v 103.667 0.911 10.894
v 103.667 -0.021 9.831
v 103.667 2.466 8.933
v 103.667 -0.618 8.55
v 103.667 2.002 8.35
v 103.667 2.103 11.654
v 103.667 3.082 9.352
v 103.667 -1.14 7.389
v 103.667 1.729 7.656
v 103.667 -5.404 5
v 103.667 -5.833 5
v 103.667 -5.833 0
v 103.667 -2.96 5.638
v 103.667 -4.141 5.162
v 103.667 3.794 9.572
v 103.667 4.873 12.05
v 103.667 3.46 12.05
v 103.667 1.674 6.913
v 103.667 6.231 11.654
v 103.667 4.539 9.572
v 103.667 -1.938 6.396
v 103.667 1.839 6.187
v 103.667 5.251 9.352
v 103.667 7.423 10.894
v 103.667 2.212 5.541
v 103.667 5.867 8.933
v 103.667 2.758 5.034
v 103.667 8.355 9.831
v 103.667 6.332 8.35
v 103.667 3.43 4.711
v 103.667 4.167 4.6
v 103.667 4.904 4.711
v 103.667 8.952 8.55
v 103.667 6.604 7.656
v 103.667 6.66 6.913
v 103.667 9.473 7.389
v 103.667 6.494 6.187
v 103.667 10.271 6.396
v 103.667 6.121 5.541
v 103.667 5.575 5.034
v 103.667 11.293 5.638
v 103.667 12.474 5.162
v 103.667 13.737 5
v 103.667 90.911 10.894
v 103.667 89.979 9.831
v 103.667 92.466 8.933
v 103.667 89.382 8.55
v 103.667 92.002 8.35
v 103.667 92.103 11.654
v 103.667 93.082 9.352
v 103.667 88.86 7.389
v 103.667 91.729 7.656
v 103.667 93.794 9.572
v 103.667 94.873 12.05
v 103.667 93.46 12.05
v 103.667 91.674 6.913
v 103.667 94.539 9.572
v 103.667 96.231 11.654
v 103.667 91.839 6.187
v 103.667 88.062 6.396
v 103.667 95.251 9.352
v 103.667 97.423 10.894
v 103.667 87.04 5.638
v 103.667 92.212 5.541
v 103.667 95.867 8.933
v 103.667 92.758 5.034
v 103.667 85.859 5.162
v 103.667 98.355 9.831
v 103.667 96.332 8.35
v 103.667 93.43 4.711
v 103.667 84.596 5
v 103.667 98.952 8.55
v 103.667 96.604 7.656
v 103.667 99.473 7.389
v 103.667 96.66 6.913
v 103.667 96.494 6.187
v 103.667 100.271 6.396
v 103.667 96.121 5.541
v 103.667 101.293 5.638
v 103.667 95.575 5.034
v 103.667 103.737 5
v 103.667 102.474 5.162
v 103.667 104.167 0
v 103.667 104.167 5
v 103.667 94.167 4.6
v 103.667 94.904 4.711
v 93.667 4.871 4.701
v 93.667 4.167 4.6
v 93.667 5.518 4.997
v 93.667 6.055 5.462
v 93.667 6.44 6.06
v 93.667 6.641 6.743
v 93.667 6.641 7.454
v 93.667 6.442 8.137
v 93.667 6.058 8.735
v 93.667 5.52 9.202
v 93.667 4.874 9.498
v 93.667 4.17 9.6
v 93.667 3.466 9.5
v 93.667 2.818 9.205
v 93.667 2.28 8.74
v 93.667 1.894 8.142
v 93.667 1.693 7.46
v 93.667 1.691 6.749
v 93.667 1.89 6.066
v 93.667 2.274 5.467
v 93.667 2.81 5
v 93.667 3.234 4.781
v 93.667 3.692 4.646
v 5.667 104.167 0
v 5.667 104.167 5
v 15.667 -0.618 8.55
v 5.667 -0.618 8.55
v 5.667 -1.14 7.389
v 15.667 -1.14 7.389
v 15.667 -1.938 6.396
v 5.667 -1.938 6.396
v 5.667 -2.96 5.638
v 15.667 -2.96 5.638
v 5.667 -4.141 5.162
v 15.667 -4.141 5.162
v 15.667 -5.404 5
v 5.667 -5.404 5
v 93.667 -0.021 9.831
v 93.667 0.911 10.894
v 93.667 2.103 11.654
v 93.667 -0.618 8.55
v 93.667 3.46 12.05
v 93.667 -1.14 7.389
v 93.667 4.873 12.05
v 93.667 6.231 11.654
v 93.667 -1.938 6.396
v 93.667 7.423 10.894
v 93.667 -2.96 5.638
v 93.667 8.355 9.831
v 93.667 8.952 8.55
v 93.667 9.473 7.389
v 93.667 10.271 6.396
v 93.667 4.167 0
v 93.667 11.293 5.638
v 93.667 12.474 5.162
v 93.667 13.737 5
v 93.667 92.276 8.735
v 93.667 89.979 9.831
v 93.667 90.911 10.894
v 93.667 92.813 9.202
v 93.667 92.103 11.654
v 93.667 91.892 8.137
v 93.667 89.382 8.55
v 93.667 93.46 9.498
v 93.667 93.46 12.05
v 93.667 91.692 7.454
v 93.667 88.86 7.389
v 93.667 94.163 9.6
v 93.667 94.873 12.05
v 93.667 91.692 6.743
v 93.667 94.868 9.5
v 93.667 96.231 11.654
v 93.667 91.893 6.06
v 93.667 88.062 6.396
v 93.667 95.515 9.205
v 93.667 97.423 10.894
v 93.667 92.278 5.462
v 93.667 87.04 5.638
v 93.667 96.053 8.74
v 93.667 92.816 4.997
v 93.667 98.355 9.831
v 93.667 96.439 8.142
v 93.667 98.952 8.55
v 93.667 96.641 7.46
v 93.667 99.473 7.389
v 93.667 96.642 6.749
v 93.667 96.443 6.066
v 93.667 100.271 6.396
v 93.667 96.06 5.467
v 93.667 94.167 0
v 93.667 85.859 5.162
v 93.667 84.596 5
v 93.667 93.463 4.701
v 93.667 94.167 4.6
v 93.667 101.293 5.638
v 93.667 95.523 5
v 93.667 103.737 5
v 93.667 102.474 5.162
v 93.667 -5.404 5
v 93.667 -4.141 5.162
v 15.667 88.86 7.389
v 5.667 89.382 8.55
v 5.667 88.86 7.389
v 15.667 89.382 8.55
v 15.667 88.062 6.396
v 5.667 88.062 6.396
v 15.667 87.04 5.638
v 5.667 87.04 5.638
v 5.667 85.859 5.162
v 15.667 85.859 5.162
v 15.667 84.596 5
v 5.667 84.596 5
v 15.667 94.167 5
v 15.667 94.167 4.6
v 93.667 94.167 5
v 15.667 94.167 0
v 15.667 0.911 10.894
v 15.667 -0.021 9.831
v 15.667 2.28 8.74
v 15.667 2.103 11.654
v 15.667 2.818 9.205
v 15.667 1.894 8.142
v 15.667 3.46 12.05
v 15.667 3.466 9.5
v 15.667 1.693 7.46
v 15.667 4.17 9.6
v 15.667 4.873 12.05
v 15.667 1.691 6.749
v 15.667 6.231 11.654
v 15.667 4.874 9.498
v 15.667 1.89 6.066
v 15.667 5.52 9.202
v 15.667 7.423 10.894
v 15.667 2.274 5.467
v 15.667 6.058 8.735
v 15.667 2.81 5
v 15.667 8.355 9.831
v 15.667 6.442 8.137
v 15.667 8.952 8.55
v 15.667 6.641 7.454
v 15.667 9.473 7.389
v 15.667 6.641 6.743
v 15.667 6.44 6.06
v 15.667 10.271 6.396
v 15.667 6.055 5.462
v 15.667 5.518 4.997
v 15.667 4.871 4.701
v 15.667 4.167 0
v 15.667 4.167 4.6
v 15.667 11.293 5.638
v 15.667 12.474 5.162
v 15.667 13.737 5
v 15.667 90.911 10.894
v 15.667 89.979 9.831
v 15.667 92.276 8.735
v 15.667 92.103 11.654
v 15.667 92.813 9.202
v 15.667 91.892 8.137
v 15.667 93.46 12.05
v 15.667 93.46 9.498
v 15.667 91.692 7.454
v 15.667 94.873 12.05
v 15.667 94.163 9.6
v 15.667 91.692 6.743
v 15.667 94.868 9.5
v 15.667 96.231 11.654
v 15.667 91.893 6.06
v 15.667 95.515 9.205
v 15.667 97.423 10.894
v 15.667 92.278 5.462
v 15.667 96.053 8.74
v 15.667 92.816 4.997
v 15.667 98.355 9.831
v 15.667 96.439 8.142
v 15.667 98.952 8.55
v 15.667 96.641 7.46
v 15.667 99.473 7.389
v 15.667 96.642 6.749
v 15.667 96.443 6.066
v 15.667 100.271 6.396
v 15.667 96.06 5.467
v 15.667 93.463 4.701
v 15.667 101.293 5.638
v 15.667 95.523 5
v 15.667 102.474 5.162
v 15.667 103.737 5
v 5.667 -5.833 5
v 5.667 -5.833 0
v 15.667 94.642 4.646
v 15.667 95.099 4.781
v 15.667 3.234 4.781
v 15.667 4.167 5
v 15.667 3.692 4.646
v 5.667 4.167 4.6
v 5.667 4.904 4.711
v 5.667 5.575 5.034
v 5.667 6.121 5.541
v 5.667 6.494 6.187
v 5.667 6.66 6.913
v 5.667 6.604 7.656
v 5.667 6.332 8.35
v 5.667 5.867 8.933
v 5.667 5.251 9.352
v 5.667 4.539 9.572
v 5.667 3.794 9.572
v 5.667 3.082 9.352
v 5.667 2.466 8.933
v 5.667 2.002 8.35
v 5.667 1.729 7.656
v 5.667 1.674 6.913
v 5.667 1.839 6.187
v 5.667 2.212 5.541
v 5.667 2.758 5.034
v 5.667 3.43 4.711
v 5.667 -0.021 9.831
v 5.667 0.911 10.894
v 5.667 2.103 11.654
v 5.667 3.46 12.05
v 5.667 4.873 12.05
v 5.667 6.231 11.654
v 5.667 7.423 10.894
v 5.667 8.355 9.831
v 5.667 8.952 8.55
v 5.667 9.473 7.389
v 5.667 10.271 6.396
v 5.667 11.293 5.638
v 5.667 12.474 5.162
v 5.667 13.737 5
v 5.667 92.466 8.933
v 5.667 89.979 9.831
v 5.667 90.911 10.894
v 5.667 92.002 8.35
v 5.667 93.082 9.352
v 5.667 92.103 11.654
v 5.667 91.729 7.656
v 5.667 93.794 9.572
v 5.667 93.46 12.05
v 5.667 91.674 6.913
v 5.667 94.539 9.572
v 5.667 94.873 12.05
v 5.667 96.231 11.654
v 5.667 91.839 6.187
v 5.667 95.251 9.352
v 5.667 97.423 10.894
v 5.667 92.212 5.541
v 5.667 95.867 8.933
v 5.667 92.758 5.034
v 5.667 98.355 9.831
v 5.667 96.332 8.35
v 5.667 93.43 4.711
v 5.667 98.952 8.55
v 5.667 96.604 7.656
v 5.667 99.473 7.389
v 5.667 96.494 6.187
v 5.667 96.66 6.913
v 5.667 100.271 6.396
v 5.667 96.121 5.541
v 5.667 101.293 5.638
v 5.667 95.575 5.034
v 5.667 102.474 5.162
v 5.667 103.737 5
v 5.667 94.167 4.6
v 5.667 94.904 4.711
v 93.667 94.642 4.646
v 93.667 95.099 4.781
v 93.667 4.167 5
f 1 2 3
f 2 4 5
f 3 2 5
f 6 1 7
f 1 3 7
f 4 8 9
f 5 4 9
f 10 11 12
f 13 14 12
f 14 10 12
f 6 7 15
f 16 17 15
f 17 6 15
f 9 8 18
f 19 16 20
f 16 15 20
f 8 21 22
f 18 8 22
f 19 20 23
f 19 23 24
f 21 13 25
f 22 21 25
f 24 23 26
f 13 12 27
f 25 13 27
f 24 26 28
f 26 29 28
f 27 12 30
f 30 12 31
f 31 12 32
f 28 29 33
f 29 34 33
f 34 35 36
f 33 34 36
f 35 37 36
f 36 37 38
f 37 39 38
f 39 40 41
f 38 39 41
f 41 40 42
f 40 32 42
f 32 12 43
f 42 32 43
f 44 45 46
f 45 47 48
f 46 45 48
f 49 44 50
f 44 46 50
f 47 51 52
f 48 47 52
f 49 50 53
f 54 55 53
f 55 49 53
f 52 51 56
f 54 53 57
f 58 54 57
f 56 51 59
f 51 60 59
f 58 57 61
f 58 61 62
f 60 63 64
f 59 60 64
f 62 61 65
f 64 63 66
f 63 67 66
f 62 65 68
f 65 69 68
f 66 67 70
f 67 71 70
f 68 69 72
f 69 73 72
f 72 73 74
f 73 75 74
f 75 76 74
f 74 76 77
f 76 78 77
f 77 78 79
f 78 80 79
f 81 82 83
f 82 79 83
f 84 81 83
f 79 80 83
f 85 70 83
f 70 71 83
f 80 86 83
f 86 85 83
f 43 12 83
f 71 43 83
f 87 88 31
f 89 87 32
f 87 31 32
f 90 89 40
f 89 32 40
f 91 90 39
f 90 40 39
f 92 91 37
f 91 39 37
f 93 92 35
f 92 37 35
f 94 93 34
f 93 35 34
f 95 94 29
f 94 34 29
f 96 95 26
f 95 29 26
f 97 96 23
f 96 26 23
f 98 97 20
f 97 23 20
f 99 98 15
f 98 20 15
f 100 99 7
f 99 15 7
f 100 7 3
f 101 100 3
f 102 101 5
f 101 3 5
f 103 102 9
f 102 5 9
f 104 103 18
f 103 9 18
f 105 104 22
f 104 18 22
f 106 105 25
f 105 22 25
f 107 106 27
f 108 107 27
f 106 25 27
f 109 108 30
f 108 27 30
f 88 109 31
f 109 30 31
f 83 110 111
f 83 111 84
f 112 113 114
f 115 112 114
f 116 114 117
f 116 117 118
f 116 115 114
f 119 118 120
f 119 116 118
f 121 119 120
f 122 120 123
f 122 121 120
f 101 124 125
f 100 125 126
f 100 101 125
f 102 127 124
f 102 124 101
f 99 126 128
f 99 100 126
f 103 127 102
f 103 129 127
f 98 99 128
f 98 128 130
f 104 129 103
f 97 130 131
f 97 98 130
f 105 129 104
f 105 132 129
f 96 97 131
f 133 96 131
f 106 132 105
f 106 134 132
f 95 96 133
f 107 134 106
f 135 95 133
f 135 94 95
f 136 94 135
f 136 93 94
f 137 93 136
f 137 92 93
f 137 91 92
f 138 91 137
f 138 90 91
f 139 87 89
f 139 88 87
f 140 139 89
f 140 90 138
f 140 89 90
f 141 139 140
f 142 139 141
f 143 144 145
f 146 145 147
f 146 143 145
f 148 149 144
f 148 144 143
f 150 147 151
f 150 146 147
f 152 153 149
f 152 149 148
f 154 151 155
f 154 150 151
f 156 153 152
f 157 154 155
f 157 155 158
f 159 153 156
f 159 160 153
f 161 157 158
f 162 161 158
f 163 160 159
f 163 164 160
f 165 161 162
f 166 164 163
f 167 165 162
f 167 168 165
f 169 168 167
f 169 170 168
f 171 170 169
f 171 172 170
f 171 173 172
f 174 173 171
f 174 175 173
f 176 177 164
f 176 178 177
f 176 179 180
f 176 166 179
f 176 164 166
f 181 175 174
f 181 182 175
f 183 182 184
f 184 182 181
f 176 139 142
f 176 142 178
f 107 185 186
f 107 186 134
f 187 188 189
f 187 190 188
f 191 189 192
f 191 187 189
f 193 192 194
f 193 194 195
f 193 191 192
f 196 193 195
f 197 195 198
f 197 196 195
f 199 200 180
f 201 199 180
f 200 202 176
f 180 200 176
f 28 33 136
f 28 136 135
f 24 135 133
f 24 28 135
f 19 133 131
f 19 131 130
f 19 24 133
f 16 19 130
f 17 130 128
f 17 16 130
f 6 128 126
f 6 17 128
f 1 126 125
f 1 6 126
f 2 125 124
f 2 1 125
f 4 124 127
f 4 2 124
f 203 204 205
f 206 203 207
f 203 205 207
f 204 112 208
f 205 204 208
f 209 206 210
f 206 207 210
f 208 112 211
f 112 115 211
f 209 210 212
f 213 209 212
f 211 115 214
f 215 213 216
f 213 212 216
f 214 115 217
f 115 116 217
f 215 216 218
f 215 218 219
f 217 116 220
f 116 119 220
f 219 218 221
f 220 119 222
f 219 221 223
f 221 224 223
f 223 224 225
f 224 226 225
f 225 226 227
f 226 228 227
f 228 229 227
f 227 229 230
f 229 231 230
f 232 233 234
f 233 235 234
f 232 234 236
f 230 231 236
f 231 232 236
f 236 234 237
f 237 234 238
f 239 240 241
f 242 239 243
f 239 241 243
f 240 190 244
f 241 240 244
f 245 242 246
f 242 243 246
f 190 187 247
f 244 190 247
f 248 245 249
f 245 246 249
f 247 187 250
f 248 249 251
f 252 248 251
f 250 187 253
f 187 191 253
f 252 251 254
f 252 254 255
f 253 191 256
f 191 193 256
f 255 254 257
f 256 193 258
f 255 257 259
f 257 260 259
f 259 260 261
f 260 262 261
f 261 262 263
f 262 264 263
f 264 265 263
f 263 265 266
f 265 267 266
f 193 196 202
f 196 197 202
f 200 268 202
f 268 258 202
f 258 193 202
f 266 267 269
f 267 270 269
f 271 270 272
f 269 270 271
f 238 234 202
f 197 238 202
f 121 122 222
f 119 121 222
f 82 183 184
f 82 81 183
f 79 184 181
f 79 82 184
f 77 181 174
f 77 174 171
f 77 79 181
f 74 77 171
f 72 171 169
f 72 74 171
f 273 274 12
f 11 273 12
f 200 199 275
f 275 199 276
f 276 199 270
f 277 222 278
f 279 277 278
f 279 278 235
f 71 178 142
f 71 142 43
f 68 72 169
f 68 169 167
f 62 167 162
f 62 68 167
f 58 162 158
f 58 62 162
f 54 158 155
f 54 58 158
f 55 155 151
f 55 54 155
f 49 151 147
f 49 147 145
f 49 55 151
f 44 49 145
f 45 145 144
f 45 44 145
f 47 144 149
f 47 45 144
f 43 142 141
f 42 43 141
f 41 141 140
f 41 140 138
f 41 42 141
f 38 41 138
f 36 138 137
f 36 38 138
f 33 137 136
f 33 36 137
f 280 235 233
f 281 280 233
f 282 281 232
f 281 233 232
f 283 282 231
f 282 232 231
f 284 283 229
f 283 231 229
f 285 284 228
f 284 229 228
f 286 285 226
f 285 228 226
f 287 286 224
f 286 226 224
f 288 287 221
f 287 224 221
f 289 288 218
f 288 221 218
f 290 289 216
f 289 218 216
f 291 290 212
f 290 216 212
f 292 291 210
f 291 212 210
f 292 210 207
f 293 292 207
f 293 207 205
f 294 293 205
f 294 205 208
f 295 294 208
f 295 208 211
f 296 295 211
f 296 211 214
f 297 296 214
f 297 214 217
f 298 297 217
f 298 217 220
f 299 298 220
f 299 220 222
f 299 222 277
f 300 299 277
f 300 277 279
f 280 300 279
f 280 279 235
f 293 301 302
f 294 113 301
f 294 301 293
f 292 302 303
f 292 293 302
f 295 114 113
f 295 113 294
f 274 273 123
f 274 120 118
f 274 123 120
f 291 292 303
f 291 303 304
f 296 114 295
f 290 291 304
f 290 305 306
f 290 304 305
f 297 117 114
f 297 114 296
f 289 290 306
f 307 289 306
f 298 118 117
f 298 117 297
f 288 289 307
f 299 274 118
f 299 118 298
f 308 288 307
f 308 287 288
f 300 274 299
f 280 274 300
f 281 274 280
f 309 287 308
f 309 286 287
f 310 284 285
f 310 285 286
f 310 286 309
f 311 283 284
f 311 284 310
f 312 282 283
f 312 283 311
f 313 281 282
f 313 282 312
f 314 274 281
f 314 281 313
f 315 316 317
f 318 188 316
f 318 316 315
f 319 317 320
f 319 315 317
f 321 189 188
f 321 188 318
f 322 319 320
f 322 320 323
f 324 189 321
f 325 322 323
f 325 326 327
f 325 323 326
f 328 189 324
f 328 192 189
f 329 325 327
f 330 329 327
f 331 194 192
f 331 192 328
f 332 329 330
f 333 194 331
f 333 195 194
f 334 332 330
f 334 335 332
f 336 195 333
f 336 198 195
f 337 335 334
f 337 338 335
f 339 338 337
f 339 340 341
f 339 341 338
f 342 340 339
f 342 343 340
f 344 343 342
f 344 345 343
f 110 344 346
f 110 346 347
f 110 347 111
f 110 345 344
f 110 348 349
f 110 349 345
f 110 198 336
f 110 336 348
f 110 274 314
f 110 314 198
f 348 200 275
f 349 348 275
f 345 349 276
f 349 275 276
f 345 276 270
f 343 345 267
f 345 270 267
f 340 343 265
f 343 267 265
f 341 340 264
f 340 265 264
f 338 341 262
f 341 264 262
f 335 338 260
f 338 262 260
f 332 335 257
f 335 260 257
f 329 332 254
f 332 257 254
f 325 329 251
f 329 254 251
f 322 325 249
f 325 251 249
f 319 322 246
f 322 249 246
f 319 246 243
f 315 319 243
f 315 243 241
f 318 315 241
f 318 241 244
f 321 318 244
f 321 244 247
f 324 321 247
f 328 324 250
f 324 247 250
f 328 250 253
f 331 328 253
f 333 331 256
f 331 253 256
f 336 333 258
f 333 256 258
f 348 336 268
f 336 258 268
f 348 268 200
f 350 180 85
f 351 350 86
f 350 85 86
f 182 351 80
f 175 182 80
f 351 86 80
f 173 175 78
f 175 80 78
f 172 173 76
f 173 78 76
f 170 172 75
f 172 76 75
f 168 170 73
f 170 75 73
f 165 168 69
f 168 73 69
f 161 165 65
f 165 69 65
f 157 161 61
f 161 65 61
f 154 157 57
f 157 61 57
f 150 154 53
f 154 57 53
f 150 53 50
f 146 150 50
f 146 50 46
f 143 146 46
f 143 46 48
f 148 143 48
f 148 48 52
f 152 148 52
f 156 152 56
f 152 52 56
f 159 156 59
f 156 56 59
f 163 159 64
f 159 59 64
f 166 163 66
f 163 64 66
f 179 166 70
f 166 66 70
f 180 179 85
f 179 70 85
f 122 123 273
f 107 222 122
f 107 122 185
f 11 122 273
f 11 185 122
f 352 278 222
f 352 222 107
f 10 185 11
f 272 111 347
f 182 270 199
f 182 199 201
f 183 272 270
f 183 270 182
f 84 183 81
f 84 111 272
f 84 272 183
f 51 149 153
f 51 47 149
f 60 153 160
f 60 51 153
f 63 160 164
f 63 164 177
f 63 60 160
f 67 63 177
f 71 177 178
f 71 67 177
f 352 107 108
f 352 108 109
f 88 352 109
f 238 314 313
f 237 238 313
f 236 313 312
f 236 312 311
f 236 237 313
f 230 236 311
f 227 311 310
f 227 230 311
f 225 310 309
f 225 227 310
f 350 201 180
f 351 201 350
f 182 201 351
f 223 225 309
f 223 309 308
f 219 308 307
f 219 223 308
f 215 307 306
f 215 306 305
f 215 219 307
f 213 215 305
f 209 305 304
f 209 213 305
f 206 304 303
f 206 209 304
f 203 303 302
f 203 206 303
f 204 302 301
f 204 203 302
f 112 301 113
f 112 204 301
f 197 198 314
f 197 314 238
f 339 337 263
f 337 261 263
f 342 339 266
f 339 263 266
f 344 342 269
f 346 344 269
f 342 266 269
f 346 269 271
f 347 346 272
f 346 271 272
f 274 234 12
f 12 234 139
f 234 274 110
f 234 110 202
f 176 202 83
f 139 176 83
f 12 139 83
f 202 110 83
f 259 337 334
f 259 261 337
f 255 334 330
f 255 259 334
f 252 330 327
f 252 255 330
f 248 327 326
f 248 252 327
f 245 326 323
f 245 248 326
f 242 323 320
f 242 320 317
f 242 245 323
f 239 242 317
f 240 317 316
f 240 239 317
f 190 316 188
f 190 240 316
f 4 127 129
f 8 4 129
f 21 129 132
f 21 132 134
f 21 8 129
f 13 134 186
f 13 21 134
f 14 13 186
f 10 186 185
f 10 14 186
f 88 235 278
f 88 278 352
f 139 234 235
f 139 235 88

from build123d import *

# Parameters (mm, degrees)
ESQUISSE1_W                     = 98
ESQUISSE1_H                     = 110
ESQUISSE1_W_2                   = 78
ESQUISSE1_H_2                   = 90
BOSS_EXTRU_1_DEPTH              = 5
ESQUISSE2_R                     = 5
ESQUISSE2_R_2                   = 2.5
BOSS_EXTRU_2_DEPTH              = 10
ESQUISSE3_R                     = 2.5
ENL_V_MAT_EXTRU_1_DEPTH         = 10
R_P_TITION_LIN_AIRE3_COUNT      = 2
R_P_TITION_LIN_AIRE3_PITCH      = 88
R_P_TITION_LIN_AIRE3_COUNT_DIR2 = 2
R_P_TITION_LIN_AIRE3_PITCH_DIR2 = 90
CONG_1_R                        = 5


with BuildPart() as part:
    # Esquisse1 → Boss.-Extru.1 (new body)
    with BuildSketch(Plane.XY):
        with Locations((54.666666667, 49.166666667)):
            Rectangle(ESQUISSE1_W, ESQUISSE1_H)
        with Locations((54.666666667, 49.166666667)):
            Rectangle(ESQUISSE1_W_2, ESQUISSE1_H_2, mode=Mode.SUBTRACT)
    extrude(amount=BOSS_EXTRU_1_DEPTH)

    # Esquisse2 → Boss.-Extru.2 (add)
    with BuildSketch(Plane(origin=(103.666666667, 0, 0), x_dir=(0, 0, -1), z_dir=(1, 0, 0))):
        with Locations((-7.1, 94.166666667)):
            Circle(ESQUISSE2_R)
        with Locations((-7.1, 94.166666667)):
            Circle(ESQUISSE2_R_2, mode=Mode.SUBTRACT)
    boss_extru_2 = extrude(amount=-BOSS_EXTRU_2_DEPTH)

    # Esquisse3 → Enlèv. mat.-Extru.1 (cut)
    with BuildSketch(Plane(origin=(103.666666667, 0, 0), x_dir=(0, 0, -1), z_dir=(1, 0, 0))):
        with Locations((-7.1, 94.166666667)):
            Circle(ESQUISSE3_R)
    enl_v_mat_extru_1 = extrude(amount=-ENL_V_MAT_EXTRU_1_DEPTH, mode=Mode.SUBTRACT)

    # Répétition linéaire3: Boss.-Extru.2, Enl_v. mat.-Extru.1 2 × 2
    with Locations(*[(-i * R_P_TITION_LIN_AIRE3_PITCH, -j * R_P_TITION_LIN_AIRE3_PITCH_DIR2, 0) for i in range(R_P_TITION_LIN_AIRE3_COUNT) for j in range(R_P_TITION_LIN_AIRE3_COUNT_DIR2) if (i, j) != (0, 0)]):
        add(boss_extru_2)
        add(enl_v_mat_extru_1, mode=Mode.SUBTRACT)

    # Congé1
    cong_1_edges = [part.edges().sort_by_distance(p)[0] for p in [
        (10.666666667, -0.370953855, 5),
        (10.666666667, 8.704287188, 5),
        (98.666666667, 89.629046145, 5),
        (98.666666667, 98.704287188, 5),
        (98.666666667, -0.370953855, 5),
        (98.666666667, 8.704287188, 5),
        (10.666666667, 89.629046145, 5),
        (10.666666667, 98.704287188, 5),
    ]]
    fillet(cong_1_edges, radius=CONG_1_R)


solid = part.part
